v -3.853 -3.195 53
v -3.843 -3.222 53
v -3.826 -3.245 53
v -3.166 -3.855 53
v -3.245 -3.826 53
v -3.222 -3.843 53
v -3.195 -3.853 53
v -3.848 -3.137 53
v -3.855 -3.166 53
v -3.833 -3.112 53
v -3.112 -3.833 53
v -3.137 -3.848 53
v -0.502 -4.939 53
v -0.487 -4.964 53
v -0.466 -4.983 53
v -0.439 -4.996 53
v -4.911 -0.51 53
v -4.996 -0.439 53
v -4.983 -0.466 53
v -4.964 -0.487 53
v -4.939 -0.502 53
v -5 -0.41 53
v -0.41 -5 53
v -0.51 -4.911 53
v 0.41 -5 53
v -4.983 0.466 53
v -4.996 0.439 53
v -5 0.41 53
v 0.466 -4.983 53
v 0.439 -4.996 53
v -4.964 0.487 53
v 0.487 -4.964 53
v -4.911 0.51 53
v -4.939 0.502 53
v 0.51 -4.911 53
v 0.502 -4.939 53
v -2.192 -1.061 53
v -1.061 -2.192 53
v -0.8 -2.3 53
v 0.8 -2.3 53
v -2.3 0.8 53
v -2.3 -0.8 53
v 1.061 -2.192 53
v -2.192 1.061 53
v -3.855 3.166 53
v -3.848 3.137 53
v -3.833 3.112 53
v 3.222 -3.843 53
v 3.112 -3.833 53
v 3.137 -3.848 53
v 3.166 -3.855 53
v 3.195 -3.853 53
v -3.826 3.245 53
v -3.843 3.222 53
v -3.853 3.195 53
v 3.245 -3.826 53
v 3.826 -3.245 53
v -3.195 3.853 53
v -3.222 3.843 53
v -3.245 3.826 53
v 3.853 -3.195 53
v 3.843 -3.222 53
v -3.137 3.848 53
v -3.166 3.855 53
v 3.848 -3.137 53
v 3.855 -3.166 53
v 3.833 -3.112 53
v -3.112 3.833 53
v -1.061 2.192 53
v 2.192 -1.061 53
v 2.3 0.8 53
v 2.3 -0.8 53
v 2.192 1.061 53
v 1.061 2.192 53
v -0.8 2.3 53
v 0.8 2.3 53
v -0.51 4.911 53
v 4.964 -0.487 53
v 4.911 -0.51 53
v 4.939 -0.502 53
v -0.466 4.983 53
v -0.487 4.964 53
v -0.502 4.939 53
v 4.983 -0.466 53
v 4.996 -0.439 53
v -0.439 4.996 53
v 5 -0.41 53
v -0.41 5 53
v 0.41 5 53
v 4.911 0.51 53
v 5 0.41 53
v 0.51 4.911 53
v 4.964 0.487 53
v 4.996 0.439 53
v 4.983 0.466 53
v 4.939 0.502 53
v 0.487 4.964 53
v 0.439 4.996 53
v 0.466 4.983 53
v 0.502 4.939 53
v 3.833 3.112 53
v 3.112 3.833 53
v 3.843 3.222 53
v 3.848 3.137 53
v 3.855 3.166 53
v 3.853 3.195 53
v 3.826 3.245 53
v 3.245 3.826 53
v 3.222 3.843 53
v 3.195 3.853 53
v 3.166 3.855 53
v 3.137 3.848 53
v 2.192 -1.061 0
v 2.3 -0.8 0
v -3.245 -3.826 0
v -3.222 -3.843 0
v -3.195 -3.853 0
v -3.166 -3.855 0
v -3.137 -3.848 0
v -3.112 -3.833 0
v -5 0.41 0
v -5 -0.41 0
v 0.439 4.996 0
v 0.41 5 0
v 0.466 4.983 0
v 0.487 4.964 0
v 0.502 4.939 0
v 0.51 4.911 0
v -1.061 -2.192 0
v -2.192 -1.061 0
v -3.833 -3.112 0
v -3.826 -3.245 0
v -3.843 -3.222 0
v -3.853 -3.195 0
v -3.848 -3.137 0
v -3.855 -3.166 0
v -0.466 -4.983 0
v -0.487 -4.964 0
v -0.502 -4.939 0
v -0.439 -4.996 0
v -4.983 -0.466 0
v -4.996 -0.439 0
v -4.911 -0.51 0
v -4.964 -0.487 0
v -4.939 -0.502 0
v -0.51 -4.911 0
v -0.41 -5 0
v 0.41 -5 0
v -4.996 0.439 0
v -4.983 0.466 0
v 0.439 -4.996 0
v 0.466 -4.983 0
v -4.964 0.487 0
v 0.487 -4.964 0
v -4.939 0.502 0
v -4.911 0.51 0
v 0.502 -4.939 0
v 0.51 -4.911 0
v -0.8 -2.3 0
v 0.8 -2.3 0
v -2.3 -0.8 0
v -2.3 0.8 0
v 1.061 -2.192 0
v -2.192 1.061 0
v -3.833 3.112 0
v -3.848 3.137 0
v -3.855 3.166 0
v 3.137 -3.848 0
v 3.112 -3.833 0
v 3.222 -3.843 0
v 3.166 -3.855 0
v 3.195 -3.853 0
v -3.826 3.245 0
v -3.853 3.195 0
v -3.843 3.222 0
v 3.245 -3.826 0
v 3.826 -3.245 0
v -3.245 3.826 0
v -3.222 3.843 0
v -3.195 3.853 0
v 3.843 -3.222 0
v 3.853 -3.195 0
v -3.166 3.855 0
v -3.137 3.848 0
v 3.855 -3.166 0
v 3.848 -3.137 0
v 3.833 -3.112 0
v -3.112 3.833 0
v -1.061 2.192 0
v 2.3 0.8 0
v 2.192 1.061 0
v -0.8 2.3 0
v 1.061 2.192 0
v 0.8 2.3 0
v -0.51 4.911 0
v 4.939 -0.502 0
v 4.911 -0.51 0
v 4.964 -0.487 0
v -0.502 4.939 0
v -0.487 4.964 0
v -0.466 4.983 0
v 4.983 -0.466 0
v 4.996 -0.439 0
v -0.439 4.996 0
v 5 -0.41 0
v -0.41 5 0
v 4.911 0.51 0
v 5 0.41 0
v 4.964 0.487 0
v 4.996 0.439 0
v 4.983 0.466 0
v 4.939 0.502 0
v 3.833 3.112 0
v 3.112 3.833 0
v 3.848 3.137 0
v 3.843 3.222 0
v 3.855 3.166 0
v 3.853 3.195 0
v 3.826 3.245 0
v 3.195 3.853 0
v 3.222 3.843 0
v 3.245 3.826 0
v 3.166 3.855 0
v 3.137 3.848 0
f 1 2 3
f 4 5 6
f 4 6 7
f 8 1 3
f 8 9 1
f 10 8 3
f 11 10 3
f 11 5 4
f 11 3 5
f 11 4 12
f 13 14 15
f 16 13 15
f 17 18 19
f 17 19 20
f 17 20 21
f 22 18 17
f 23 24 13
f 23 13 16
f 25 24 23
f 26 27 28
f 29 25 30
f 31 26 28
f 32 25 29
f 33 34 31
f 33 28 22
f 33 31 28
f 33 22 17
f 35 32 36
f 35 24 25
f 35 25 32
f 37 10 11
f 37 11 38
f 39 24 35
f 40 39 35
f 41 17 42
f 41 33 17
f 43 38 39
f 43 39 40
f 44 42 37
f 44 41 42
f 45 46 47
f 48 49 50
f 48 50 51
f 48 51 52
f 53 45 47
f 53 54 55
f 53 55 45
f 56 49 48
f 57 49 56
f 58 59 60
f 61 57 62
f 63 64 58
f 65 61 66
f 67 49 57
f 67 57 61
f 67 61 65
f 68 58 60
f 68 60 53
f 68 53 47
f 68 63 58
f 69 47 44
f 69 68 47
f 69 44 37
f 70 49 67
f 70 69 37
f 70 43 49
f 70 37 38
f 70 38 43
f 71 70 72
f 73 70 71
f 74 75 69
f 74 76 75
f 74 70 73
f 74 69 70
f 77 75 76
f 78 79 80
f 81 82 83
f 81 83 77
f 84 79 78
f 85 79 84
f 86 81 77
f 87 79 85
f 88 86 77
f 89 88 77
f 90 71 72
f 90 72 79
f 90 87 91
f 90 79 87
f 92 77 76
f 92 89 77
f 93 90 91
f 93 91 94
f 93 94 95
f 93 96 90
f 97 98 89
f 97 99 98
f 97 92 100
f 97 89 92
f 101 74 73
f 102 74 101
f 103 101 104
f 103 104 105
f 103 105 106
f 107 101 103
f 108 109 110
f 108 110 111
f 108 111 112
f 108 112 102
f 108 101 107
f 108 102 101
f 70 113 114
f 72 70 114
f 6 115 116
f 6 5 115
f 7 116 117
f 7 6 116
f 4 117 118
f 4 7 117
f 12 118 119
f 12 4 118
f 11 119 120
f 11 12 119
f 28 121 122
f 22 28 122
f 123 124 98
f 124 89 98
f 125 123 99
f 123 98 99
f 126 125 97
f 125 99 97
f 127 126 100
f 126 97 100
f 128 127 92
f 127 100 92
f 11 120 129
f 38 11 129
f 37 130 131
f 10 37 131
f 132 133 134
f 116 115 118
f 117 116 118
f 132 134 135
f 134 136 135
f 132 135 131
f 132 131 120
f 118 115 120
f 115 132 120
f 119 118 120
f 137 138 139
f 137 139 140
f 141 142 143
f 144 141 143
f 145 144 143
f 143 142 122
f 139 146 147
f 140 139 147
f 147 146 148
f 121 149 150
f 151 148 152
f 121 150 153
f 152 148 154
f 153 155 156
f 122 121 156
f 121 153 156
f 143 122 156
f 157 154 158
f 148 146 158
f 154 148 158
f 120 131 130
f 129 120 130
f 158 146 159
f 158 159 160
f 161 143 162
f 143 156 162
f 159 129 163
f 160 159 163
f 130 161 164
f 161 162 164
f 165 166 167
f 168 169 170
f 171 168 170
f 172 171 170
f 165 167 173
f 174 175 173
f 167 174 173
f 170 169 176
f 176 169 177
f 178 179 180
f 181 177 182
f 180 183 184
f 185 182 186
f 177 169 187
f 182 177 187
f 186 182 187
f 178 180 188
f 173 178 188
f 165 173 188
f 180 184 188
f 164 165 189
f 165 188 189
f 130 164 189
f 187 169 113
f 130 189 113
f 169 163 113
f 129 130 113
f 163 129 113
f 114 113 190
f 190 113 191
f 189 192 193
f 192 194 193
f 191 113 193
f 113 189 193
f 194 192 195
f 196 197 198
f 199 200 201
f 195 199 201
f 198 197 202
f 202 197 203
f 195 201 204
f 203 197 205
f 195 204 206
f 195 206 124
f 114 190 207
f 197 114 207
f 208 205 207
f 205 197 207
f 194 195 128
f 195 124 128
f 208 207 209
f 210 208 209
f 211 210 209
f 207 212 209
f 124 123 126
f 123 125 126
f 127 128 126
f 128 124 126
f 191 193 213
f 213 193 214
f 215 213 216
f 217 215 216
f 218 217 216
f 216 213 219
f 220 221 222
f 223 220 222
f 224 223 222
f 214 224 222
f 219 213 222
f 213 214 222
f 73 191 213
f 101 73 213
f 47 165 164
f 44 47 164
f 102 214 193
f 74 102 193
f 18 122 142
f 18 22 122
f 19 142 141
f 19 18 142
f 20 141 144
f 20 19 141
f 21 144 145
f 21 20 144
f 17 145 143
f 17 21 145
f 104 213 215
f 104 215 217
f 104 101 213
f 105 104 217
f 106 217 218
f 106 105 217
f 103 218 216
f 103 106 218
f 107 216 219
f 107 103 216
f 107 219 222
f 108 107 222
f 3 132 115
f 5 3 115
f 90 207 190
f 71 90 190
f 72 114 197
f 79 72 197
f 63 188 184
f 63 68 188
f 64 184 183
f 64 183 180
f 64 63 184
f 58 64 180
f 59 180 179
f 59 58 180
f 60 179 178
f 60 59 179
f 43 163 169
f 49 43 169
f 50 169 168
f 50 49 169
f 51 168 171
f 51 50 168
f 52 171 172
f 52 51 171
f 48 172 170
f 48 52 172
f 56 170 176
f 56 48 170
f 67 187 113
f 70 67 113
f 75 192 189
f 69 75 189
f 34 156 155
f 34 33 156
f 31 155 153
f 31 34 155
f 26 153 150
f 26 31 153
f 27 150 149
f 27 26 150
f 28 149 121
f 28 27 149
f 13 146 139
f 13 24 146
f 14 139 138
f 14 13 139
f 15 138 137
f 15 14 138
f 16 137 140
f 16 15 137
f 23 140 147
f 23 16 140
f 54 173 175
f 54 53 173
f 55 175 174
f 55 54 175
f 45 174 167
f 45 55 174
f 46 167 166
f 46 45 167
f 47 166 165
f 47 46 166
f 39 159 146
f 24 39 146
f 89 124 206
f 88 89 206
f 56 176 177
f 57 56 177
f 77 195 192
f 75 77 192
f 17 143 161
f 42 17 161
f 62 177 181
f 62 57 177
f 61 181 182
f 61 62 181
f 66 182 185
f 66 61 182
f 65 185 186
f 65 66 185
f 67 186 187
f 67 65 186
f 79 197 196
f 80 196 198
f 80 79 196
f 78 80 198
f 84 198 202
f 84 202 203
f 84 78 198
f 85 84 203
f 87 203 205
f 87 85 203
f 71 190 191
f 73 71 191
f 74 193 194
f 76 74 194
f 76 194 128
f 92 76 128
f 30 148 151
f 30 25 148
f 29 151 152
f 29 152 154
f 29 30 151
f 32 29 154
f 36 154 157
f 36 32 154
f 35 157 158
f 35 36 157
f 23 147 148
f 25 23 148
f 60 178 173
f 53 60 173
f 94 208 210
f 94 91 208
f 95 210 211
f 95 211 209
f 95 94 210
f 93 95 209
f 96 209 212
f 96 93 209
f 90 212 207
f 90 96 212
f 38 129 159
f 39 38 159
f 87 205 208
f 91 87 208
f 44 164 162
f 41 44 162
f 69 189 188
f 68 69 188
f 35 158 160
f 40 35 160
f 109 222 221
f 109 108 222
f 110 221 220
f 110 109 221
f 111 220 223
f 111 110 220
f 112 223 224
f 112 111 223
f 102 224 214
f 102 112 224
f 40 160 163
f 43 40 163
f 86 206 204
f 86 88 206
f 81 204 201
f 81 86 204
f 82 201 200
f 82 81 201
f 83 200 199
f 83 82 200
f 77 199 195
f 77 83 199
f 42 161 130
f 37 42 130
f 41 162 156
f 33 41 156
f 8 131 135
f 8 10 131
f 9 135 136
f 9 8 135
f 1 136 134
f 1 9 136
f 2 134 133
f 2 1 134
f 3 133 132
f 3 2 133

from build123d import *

# Parameters (mm, degrees)
F1_DEPTH = 53
F2_R     = 0.1
F3_R     = 1.40385
F4_DEPTH = 10


with BuildPart() as f1:
    # F0 (on Top) → F1 (new body)
    with BuildSketch(Plane.XY):
        Polygon((0.5, 5), (0, 5), (-0.5, 5), (-0.8, 2.3), (-1.06066, 2.192031), (-3.181981, 3.889087), (-3.535534, 3.535534), (-3.889087, 3.181981), (-2.192031, 1.06066), (-2.3, 0.8), (-5, 0.5), (-5, 0), (-5, -0.5), (-2.3, -0.8), (-2.192031, -1.06066), (-3.889087, -3.181981), (-3.535534, -3.535534), (-3.181981, -3.889087), (-1.06066, -2.192031), (-0.8, -2.3), (-0.5, -5), (0, -5), (0.5, -5), (0.8, -2.3), (1.06066, -2.192031), (3.181981, -3.889087), (3.535534, -3.535534), (3.889087, -3.181981), (2.192031, -1.06066), (2.3, -0.8), (5, -0.5), (5, 0), (5, 0.5), (2.3, 0.8), (2.192031, 1.06066), (3.889087, 3.181981), (3.535534, 3.535534), (3.181981, 3.889087), (1.06066, 2.192031), (0.8, 2.3), align=None)
    extrude(amount=F1_DEPTH)

    # F2
    f2_edges = [f1.edges().sort_by_distance(p)[0] for p in [
        (3.889087, 3.181981, 26.5),
        (3.181981, 3.889087, 26.5),
        (5, 0.5, 26.5),
        (5, -0.5, 26.5),
        (3.889087, -3.181981, 26.5),
        (3.181981, -3.889087, 26.5),
        (-3.889087, -3.181981, 26.5),
        (-3.181981, -3.889087, 26.5),
        (-0.5, -5, 26.5),
        (0.5, -5, 26.5),
        (-5, -0.5, 26.5),
        (-5, 0.5, 26.5),
        (-3.889087, 3.181981, 26.5),
        (-3.181981, 3.889087, 26.5),
        (-0.5, 5, 26.5),
        (0.5, 5, 26.5),
    ]]
    fillet(f2_edges, radius=F2_R)


with BuildPart() as f4:
    # F3 (on face) → F4 (new body)
    with BuildSketch(Plane(origin=(0, 0, 0), x_dir=(1, 0, 0), z_dir=(0, 0, -1))):
        Circle(F3_R)
    extrude(amount=F4_DEPTH)


solid = f1.part
